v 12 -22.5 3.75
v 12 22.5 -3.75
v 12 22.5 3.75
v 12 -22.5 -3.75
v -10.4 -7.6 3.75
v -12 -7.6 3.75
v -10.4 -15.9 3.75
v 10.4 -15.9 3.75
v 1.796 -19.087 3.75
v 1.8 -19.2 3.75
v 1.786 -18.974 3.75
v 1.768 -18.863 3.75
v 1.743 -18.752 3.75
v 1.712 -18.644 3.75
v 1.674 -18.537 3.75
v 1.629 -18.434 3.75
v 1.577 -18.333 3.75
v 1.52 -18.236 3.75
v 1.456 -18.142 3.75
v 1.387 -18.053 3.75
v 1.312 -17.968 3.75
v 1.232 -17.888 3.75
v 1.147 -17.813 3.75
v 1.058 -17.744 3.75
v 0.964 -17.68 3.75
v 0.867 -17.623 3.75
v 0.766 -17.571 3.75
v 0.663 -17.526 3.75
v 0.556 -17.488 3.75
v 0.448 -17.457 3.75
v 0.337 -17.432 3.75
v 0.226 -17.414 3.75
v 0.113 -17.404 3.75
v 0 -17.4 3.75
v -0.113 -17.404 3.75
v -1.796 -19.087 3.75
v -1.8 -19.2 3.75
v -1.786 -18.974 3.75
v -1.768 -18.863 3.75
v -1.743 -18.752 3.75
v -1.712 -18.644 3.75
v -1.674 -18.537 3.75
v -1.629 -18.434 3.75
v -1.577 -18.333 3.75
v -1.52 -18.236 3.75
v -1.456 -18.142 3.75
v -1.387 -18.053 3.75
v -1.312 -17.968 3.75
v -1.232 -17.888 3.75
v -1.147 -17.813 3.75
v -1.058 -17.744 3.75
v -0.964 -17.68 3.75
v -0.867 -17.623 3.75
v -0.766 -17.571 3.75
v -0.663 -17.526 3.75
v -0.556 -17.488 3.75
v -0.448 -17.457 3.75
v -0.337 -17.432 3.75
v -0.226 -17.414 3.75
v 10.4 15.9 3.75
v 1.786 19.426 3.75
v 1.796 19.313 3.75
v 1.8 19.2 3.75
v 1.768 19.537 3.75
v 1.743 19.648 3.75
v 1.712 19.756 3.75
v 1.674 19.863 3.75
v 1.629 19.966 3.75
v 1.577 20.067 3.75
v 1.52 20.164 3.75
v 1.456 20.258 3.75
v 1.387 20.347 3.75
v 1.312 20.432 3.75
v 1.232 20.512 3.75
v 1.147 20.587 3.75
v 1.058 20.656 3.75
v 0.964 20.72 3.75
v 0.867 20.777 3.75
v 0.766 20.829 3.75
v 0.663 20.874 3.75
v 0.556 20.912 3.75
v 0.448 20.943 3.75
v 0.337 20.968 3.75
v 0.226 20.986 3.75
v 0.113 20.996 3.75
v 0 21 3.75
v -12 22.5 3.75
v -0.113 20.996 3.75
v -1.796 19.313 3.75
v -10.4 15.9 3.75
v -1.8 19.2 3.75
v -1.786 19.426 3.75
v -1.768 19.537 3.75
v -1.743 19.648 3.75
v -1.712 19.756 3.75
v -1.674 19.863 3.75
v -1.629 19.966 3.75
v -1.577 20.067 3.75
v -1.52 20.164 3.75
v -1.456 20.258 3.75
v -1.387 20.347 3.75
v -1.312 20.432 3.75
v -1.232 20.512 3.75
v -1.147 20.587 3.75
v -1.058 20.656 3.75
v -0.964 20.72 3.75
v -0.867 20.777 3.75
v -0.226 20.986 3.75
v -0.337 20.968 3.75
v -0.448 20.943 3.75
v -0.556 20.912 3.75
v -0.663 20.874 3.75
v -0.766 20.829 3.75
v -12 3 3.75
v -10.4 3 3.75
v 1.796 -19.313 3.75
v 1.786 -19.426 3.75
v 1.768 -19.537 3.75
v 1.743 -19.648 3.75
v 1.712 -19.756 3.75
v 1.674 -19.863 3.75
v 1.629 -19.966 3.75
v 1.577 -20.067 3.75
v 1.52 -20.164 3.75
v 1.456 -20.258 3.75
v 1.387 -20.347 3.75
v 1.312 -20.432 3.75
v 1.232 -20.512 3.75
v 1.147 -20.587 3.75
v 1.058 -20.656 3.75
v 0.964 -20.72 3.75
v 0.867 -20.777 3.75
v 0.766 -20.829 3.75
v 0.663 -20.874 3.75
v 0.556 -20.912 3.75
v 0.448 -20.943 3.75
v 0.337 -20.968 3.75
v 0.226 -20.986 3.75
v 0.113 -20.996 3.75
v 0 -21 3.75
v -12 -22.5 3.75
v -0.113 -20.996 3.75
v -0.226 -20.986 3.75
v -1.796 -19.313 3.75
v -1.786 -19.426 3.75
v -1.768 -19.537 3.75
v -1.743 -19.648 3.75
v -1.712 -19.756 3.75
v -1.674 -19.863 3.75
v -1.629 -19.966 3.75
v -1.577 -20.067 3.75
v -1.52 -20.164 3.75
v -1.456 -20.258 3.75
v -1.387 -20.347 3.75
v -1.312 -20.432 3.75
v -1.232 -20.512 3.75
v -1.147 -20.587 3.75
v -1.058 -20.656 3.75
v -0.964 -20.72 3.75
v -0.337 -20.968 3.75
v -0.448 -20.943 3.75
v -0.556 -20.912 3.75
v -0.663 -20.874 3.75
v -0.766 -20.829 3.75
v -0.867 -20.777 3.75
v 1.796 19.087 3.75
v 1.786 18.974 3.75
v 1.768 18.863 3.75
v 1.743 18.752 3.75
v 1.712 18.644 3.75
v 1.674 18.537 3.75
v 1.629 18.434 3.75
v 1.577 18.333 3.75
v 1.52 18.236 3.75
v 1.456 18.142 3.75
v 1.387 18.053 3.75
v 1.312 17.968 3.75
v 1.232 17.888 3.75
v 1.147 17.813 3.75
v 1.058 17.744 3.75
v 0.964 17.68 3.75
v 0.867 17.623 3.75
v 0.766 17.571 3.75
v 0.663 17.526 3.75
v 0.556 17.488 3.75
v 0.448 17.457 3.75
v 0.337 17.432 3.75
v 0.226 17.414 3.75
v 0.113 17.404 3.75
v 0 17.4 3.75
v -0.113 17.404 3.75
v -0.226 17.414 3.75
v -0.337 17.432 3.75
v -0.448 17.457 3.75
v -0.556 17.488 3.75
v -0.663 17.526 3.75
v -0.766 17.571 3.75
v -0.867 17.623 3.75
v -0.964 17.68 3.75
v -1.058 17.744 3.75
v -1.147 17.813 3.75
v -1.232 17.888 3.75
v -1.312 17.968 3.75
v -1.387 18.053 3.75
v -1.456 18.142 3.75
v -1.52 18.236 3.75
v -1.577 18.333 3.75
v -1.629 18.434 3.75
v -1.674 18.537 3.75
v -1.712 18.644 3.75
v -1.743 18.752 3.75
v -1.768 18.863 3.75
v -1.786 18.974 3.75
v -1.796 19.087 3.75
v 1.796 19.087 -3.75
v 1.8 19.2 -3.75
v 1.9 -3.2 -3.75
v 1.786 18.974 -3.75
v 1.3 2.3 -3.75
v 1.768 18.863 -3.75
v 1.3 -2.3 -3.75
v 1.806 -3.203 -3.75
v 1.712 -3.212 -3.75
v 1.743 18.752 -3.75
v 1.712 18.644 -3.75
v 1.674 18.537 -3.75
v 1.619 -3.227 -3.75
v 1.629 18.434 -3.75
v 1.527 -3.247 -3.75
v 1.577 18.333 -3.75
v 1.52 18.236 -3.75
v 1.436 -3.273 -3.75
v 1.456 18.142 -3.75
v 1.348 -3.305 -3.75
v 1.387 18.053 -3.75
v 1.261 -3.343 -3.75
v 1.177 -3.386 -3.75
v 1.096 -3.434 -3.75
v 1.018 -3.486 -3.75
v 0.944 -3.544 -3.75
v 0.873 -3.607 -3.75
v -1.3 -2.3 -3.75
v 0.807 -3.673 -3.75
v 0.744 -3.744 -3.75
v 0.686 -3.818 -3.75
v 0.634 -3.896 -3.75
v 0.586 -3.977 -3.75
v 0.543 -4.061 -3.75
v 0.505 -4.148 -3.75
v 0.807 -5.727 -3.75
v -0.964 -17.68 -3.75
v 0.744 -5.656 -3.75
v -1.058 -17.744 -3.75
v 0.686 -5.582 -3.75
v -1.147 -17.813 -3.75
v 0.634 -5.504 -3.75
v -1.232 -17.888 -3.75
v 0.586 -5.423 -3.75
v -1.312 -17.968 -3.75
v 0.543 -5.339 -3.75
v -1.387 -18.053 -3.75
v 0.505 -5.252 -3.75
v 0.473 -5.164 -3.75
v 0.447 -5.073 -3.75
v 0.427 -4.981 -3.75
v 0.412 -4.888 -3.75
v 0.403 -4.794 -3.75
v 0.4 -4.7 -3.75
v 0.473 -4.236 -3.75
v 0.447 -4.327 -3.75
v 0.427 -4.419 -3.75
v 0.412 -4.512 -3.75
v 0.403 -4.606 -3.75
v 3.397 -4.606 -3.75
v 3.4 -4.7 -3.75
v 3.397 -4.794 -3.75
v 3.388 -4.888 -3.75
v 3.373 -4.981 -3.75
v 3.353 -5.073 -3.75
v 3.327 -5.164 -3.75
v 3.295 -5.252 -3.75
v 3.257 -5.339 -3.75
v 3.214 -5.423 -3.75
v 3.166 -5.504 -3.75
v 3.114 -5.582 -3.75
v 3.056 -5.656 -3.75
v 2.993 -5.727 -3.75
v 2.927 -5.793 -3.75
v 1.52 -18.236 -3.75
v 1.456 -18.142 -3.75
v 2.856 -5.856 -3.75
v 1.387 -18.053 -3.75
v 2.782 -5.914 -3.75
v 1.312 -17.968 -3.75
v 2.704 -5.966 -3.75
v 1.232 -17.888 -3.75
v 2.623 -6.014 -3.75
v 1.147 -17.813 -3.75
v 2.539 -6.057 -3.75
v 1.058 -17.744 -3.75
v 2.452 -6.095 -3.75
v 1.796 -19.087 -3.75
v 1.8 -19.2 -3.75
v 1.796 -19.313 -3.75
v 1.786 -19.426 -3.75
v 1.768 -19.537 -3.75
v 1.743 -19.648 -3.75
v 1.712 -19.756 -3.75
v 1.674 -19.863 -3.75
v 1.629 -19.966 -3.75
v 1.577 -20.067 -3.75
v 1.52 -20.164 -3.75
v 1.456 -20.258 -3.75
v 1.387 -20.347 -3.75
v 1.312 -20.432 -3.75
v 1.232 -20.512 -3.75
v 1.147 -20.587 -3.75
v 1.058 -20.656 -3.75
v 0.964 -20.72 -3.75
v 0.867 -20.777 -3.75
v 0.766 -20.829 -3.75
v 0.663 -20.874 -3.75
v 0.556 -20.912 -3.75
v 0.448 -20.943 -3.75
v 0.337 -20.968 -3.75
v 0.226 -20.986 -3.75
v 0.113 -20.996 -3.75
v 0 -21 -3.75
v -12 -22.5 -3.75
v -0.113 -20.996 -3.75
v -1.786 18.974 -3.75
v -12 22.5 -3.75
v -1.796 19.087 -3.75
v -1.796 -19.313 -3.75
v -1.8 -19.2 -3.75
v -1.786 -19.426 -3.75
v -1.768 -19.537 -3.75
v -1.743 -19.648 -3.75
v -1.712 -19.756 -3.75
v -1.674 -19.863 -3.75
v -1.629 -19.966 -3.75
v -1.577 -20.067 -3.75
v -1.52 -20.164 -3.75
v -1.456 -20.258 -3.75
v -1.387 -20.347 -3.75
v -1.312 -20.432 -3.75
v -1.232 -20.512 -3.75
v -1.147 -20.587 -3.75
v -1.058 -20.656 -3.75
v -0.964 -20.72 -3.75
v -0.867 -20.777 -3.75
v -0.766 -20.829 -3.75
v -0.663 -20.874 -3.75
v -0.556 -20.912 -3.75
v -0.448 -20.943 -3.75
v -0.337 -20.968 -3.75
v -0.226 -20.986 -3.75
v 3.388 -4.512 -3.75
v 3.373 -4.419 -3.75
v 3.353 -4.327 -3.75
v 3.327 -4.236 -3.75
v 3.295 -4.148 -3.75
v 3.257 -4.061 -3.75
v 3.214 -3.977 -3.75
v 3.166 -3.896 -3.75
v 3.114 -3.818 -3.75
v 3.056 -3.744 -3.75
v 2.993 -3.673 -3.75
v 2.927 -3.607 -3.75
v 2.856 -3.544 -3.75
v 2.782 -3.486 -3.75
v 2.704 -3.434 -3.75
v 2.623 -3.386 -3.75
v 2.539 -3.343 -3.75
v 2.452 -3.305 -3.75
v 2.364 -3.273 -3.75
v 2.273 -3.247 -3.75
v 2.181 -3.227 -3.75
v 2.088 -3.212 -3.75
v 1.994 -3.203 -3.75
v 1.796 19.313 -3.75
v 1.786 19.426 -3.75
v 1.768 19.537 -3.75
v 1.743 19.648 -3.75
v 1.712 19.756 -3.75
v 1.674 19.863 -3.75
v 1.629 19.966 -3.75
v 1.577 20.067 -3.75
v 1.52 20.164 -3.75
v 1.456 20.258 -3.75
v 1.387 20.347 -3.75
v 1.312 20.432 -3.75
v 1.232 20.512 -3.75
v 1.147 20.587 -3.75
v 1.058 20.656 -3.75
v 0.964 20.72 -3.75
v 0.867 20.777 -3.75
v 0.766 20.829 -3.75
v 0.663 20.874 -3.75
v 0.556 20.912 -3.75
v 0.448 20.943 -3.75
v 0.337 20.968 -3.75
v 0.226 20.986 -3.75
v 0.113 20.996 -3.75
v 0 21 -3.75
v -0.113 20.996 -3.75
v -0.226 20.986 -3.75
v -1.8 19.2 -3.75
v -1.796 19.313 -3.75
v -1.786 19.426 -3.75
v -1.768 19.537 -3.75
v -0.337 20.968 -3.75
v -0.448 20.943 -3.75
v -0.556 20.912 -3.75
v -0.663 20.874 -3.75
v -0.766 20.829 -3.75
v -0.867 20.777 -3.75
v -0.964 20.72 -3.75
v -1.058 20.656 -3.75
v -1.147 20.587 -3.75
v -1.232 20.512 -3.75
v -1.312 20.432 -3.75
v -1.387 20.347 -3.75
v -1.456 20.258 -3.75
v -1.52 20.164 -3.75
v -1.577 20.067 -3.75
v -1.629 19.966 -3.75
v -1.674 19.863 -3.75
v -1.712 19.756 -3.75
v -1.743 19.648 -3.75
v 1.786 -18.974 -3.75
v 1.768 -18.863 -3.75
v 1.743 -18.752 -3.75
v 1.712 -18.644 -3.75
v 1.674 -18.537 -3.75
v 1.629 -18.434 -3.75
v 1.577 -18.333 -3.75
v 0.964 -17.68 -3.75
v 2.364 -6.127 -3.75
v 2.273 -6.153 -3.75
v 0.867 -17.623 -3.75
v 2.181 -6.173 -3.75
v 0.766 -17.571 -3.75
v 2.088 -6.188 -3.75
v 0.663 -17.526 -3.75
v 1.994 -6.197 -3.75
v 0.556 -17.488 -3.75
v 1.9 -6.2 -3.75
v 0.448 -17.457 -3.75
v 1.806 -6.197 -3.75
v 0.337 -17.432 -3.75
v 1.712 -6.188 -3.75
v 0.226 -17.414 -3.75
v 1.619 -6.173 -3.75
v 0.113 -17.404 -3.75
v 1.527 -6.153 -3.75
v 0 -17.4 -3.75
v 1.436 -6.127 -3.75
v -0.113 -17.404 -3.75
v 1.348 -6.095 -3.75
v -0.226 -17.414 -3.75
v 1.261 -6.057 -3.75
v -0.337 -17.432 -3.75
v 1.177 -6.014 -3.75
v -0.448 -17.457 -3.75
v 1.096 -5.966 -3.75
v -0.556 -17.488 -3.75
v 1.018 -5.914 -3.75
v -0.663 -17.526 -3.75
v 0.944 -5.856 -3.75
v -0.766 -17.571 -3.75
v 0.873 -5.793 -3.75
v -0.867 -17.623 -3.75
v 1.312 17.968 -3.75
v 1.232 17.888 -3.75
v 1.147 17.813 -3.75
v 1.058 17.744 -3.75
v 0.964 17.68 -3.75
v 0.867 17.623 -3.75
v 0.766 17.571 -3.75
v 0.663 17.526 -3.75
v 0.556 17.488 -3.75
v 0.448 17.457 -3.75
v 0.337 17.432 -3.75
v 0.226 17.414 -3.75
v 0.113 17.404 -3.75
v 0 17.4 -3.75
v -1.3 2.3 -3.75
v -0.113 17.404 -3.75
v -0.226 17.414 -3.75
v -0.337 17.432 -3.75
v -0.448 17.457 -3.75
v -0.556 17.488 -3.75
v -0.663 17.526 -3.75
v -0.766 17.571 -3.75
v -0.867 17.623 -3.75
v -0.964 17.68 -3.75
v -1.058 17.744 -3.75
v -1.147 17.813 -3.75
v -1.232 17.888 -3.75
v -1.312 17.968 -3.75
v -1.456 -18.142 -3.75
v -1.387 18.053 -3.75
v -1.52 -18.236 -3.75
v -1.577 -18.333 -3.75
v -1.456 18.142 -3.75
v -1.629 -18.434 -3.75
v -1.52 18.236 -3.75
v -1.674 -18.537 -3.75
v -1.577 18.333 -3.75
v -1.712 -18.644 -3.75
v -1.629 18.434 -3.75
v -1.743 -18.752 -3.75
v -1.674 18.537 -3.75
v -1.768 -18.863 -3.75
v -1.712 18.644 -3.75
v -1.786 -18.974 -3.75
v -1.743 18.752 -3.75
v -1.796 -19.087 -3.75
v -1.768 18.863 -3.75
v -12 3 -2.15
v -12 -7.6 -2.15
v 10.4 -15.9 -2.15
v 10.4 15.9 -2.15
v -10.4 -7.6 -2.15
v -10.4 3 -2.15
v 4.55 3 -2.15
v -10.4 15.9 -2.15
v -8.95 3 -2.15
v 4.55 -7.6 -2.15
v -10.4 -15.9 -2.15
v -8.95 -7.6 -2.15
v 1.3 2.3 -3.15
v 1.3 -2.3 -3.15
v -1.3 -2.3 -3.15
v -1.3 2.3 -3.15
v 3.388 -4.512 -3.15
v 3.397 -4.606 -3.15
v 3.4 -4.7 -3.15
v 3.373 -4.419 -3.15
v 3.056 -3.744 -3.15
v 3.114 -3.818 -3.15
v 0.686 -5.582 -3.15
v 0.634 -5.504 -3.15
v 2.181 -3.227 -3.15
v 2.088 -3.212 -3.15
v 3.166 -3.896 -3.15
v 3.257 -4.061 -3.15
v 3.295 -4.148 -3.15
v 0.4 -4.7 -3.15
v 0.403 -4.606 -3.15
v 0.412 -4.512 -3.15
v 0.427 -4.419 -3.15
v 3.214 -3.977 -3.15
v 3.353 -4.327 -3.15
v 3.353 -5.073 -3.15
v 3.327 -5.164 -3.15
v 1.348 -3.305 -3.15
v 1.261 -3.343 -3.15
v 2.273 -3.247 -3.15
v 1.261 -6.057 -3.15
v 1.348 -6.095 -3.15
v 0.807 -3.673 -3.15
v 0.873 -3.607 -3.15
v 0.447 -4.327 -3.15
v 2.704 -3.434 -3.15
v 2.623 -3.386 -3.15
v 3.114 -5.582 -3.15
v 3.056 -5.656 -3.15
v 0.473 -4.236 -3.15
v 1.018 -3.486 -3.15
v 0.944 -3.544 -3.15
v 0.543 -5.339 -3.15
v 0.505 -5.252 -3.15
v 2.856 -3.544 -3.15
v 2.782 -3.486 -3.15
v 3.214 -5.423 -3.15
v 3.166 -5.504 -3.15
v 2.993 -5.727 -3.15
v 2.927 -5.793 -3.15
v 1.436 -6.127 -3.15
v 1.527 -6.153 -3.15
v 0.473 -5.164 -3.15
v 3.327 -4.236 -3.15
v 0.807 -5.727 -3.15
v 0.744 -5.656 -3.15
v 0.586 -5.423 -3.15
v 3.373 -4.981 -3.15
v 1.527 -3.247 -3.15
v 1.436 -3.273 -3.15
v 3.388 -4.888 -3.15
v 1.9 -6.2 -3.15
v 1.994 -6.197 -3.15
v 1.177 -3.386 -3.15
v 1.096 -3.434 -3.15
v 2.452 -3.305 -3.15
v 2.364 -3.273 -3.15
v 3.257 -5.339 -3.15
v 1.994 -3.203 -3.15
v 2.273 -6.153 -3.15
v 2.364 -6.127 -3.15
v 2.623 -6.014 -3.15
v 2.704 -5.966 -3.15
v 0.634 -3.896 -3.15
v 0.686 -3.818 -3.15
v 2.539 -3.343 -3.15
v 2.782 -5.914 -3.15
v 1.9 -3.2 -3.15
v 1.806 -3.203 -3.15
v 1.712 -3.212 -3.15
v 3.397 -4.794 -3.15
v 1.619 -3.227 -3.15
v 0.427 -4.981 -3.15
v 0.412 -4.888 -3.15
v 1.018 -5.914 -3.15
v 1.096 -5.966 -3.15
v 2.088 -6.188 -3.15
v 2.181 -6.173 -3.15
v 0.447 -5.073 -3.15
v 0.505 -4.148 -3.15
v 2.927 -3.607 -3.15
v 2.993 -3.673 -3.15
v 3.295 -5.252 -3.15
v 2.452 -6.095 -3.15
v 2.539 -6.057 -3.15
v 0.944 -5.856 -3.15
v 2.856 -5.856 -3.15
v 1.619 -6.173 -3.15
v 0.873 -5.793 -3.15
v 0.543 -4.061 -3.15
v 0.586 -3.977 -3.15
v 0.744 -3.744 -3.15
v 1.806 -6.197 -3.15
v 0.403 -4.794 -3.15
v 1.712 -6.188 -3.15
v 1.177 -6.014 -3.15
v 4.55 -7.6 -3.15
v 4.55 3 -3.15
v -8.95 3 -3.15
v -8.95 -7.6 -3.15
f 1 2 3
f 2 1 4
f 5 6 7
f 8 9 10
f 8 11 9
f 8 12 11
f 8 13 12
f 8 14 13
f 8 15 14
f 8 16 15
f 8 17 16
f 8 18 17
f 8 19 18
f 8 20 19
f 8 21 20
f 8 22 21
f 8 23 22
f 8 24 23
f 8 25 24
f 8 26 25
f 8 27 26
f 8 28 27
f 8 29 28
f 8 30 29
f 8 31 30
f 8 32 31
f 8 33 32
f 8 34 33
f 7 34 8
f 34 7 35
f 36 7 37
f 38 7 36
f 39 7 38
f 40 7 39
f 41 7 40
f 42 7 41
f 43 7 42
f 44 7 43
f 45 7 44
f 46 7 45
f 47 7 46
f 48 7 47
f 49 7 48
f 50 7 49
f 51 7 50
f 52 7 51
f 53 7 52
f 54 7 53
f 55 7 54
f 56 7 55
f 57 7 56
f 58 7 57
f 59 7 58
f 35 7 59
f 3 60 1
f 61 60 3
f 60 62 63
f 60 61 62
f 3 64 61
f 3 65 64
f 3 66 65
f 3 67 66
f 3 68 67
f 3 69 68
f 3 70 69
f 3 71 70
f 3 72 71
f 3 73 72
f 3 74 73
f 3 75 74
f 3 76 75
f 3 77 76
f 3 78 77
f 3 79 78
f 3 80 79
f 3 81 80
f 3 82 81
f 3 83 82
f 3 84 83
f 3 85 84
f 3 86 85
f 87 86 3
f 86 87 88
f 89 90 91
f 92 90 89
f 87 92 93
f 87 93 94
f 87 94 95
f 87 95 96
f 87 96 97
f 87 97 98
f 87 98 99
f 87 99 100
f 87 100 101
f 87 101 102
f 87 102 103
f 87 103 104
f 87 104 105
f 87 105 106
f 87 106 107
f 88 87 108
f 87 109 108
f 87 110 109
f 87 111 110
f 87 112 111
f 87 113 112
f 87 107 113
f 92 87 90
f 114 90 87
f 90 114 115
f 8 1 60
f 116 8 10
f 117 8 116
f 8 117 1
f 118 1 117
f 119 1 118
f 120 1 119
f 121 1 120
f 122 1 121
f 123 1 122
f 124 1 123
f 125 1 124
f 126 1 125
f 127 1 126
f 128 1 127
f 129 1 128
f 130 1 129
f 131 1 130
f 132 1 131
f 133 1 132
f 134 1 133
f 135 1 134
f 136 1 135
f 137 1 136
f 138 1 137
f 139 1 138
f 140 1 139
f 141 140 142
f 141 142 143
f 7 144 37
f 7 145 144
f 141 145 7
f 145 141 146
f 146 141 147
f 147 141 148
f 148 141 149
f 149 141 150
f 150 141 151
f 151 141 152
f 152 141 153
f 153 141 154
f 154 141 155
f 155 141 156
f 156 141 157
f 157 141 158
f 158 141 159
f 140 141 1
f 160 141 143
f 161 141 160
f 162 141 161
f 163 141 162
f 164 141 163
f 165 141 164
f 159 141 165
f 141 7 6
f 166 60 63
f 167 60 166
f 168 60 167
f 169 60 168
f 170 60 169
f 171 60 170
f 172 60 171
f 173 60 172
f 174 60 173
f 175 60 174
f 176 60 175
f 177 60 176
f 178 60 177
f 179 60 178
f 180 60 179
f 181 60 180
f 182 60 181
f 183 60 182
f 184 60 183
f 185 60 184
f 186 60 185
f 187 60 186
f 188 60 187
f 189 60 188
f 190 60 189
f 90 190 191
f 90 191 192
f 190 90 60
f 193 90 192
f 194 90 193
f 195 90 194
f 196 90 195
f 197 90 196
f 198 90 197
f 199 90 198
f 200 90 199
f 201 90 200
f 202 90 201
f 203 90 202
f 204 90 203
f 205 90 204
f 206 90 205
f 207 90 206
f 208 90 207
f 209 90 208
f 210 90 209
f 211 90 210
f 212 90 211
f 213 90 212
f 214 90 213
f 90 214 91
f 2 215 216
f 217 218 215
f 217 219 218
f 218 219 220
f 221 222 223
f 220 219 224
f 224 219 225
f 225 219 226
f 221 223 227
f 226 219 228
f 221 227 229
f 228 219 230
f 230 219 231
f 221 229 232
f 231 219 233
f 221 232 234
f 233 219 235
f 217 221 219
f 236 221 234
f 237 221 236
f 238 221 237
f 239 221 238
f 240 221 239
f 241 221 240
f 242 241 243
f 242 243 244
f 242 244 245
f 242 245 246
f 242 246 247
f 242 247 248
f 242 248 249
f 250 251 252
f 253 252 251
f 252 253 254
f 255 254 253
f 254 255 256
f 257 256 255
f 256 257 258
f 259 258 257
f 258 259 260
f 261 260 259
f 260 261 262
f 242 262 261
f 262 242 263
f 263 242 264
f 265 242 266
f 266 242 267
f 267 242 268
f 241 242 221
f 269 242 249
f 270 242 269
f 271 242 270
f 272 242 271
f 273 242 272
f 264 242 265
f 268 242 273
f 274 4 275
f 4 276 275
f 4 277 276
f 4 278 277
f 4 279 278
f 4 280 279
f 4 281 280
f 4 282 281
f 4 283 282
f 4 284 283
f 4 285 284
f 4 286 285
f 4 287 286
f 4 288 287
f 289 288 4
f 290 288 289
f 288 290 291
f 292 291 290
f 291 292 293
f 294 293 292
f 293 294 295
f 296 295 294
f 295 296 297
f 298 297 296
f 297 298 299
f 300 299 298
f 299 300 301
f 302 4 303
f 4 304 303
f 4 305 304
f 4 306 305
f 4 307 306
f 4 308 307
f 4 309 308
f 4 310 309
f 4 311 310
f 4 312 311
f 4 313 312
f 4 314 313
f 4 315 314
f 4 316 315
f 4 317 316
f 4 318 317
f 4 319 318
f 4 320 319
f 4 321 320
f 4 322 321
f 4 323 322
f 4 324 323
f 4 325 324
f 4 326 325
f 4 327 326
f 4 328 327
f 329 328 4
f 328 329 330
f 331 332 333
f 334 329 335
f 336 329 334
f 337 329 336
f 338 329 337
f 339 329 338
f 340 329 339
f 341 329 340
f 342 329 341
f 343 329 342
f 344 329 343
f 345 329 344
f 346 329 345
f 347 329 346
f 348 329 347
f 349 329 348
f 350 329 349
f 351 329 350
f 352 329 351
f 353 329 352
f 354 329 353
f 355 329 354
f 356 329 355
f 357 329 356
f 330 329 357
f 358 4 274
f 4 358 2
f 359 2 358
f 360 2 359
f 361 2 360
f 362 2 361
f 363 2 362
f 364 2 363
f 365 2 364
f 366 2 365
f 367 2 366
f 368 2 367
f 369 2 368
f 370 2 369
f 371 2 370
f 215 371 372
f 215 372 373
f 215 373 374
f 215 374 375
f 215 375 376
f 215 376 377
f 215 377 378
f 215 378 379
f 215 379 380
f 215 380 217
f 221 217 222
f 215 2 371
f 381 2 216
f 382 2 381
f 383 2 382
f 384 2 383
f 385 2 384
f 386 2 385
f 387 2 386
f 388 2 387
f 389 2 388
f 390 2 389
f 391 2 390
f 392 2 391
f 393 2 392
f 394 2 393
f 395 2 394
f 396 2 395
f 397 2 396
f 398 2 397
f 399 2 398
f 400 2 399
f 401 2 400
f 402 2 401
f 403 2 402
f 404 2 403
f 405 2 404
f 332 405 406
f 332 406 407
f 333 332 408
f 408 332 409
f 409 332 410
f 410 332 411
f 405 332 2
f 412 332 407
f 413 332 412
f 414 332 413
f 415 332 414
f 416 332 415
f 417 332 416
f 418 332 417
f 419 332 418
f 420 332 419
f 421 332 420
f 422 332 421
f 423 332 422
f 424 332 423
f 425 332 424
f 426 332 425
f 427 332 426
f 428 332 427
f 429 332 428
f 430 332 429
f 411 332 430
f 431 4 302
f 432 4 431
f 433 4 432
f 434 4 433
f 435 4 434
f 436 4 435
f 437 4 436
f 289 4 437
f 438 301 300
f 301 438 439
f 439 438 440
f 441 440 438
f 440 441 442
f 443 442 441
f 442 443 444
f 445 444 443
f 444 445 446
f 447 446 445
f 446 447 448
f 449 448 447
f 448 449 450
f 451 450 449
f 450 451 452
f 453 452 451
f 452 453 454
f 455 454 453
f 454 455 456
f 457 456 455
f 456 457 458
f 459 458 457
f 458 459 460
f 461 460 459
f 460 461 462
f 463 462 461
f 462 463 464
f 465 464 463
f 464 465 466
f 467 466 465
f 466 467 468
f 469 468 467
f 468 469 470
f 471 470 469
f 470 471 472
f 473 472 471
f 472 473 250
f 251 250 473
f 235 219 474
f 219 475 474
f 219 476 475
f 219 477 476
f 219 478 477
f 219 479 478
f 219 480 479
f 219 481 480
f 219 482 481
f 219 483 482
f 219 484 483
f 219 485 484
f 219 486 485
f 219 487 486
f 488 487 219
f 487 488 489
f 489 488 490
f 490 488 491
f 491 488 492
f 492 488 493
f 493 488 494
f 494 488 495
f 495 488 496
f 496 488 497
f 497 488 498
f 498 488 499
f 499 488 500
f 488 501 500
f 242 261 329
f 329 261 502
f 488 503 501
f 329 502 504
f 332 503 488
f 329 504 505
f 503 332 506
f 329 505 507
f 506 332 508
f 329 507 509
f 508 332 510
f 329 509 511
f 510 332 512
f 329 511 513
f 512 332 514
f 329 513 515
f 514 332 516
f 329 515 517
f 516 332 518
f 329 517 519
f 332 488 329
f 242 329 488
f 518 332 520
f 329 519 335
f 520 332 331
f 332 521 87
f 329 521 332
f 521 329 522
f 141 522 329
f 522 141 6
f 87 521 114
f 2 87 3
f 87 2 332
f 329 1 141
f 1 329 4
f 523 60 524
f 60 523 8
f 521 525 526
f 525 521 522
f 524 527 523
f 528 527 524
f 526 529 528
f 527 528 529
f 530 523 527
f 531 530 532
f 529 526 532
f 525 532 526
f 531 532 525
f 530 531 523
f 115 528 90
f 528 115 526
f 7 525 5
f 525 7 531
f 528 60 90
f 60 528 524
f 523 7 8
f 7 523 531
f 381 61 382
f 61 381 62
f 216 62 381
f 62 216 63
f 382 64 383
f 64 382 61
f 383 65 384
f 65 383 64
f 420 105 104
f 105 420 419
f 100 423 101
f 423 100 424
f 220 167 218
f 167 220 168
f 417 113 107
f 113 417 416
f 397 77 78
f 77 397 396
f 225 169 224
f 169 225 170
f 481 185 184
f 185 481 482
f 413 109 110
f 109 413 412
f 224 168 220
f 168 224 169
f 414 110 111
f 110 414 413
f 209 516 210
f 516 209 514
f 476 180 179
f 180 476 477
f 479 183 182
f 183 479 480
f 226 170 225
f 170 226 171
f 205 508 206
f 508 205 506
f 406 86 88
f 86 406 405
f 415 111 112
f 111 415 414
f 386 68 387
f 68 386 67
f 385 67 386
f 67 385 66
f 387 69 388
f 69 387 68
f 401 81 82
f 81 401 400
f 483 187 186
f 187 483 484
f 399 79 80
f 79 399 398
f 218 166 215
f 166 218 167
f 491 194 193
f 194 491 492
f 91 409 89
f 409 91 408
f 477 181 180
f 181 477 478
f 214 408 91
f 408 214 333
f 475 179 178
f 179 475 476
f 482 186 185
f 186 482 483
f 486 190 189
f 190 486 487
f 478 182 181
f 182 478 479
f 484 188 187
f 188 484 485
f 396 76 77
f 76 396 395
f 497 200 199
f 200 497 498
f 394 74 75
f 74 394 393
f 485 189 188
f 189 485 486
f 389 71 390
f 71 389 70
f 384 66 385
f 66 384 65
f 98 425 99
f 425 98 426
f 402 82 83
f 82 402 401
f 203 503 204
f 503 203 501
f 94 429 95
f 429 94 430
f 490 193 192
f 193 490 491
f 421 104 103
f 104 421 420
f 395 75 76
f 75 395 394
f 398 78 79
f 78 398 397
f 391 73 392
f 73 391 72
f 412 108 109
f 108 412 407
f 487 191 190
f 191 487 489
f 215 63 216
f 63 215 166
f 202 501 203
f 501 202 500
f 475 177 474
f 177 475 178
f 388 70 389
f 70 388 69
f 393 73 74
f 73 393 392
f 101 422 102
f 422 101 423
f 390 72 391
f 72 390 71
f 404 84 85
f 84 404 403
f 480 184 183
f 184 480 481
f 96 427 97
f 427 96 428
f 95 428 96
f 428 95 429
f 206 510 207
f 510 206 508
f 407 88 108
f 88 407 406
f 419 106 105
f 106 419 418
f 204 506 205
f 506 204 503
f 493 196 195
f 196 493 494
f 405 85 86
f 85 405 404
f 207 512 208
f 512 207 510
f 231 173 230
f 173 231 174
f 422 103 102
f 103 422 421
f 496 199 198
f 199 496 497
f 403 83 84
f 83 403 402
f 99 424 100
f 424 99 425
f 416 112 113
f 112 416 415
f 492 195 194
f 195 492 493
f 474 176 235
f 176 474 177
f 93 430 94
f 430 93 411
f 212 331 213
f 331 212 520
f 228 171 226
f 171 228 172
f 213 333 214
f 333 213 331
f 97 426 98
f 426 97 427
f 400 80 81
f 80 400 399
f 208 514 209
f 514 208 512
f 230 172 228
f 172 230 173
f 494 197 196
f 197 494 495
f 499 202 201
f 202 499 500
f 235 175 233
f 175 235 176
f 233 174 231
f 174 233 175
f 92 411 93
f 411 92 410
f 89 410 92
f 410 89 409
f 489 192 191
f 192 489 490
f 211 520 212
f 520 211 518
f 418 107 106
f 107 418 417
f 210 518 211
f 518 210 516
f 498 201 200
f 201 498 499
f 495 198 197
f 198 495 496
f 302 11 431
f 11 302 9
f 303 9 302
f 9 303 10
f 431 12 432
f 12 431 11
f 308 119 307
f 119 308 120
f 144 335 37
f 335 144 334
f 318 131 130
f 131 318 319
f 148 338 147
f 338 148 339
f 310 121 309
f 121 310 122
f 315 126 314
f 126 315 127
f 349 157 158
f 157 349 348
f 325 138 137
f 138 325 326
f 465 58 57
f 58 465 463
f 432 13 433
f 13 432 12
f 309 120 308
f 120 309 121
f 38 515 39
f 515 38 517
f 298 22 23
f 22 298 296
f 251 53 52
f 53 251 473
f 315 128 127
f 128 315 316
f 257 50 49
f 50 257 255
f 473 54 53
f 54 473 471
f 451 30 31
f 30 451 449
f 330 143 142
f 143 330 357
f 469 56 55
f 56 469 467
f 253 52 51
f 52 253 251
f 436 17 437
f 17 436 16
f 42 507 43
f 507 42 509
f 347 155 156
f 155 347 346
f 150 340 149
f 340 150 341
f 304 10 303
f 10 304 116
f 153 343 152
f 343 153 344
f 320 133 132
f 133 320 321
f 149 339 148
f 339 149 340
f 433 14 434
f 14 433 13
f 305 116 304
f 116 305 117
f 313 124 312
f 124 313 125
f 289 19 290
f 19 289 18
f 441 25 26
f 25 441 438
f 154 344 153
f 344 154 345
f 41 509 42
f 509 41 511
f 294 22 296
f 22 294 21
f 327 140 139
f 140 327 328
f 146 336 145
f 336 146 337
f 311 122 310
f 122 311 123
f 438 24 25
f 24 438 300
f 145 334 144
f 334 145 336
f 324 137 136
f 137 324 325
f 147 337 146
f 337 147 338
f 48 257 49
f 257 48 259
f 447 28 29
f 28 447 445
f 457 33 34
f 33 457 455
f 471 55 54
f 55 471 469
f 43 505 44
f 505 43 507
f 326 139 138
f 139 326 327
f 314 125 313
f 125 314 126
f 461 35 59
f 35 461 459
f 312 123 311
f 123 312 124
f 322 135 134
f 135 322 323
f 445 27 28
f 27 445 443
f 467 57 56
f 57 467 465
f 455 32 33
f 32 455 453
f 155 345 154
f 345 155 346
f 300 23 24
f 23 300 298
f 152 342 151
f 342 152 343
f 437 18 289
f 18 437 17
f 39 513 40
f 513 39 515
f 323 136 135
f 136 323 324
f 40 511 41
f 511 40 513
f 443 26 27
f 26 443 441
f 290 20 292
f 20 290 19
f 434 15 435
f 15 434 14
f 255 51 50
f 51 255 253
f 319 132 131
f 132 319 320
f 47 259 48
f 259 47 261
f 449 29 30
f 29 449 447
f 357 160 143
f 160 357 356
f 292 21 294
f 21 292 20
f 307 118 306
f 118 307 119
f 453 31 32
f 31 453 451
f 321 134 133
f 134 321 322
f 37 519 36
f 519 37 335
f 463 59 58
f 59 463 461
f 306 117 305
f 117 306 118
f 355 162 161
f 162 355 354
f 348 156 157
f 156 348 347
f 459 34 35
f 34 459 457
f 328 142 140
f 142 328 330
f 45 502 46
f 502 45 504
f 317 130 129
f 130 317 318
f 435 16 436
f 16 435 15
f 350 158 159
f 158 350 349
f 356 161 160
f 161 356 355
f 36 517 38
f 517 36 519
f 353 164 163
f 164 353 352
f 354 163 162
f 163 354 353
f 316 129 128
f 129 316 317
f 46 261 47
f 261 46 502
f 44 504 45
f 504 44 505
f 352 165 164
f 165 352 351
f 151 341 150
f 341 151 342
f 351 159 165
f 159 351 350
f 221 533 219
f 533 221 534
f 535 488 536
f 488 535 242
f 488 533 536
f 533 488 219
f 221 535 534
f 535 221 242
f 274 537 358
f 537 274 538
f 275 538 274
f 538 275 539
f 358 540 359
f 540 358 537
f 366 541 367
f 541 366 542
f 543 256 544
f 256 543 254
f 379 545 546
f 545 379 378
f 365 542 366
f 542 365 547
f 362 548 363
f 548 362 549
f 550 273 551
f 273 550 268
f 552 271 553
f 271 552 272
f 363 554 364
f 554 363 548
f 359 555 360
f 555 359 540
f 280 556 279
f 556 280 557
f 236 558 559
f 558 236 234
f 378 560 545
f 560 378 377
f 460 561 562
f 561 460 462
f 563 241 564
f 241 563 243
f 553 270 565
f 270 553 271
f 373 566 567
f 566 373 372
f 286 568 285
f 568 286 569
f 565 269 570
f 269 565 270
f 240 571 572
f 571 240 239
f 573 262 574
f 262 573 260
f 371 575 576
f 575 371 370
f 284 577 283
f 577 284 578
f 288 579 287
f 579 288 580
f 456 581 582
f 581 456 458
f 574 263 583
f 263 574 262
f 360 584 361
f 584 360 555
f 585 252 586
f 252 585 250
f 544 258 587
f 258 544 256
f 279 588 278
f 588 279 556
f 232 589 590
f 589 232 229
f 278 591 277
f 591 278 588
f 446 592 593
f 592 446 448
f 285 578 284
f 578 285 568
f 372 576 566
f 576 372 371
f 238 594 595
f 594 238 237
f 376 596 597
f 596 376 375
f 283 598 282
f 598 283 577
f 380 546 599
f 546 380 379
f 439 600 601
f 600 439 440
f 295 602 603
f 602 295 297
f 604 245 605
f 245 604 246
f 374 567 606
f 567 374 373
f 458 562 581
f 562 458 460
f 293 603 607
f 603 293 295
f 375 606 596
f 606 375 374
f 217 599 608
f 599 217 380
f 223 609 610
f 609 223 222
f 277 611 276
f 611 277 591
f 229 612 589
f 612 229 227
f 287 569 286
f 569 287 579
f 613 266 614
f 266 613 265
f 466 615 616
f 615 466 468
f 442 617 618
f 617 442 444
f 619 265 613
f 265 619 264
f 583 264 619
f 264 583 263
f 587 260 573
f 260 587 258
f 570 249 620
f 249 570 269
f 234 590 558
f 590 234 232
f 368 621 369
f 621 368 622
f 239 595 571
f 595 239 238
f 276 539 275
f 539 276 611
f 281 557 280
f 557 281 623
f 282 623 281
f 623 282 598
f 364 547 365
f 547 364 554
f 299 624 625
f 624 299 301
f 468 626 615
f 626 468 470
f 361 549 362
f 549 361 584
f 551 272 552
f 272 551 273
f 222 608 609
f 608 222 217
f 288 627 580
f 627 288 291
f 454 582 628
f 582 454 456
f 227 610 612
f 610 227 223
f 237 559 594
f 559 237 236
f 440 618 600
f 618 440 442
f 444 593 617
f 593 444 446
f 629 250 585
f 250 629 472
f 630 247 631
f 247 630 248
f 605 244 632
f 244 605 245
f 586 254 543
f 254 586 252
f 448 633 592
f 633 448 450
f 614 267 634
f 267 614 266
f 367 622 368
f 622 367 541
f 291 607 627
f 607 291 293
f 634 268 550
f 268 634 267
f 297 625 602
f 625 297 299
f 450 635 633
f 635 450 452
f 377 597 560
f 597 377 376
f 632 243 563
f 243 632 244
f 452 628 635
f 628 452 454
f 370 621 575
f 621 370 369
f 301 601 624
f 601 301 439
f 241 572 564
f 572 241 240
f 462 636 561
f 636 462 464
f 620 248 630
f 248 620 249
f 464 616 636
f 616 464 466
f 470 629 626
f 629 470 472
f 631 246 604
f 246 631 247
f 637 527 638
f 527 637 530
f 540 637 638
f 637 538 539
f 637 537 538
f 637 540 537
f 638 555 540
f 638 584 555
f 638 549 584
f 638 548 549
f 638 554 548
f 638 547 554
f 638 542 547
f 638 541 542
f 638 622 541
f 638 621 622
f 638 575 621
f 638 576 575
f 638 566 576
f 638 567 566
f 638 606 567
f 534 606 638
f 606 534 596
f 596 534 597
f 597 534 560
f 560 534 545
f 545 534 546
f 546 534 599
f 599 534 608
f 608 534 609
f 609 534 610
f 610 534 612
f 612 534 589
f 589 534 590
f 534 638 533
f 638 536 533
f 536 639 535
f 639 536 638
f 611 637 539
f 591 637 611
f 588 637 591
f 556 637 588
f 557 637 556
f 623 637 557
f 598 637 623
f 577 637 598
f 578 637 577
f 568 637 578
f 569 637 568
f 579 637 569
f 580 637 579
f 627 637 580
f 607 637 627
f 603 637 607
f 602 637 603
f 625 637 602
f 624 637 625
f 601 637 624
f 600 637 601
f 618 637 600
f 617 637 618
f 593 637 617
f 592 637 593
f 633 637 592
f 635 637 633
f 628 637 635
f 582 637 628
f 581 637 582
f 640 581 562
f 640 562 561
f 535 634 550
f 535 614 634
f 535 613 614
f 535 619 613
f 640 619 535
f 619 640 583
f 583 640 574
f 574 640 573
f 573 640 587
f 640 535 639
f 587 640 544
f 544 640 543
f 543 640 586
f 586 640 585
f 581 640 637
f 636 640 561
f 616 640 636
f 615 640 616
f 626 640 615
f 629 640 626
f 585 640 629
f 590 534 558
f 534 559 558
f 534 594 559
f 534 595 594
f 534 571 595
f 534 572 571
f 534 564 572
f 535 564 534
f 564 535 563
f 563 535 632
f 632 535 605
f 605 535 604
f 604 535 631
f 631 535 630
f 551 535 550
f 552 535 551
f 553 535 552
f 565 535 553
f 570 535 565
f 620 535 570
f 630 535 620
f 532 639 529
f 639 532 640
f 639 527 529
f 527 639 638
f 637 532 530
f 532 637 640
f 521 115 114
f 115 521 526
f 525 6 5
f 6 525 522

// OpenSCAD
/*
    Scanner para análisis tridimensional de cobertura vegetal del suelo
    
    Descripción de la pieza: Zócalo para sensor laser VL53L0X. Va atornillado a la base del carro móvil que se desplaza sobre el eje X.
    Cantidad requerida: 1.

    Autor: Matias J. Micheletto    
    Noviembre 2017
    Directores: Rodrigo Santos - Juan Galantini
    Laboratorio de Sistemas Digitales
    Universidad Nacional del Sur - Departamento de Ingeniería Eléctrica y Computadoras    
*/

$fn = 100; // Resolucion del modelo

// Dimensiones exteriores del montaje
W = 24; // Ancho (en direccion X)
L = 45; // Largo (en direccion Y)
H = 7.5;  // Altura (en direccion Z)
e = 1.6;  // Espesor fondo y paredes

// Dimensiones del sensor
Ws = 2.4+0.2; // Ancho (X)
Ls = 4.4+0.2; // Alto (Y)

// Dimensiones y posicion de la plaqueta
Wp = 13.3+0.2; // Ancho (X)
Lp = 10.4+0.2; // Largo (Y)
ep = 1; // Espesor del hundimiento
xp = -2.2;
yp = -2.3;

// Dimensiones y posicion del tornillo de la plaqueta
Rs = 1.3+0.2; // Radio del orificio para el tornillo de la plaqueta
xs = 1.9;
ys = -4.7;

// Tornillos de ajuste
Rp = 1.8; // Radio de los orificios para tornillos
s = 1.5; // Separacion entre el orificio y el borde de la pieza



difference(){
    // Envolvente
    cube([W,L,H], center = true);
    
    // Interior
    translate([0,0,e/2])
        cube([W-2*e,L-4*s-4*Rp,H-e], center = true);
    
    // Agujeros para tornillos
    translate([0,L/2-Rp-s,0])
        cylinder(r = Rp, h = H, center = true);
    translate([0,-L/2+Rp+s,0])
        cylinder(r = Rp, h = H, center = true);
    
    // Orificio para sensor (centrado)
    translate([0,0,-H/2+e/2])
        cube([Ws,Ls,e], center = true);
    
    // Orificio para tornillo de la plaqueta
    translate([xs,ys,-H/2+e/2])
        cylinder(r = Rs, h = e, center = true);
    
    // Hueco para plaqueta    
    translate([xp,yp,-H/2+e-ep/2])
        cube([Wp,Lp,ep], center = true);
        
    // Agujero para sacar los cables
    translate([-W/2+e/2,yp,e/2])
        cube([e,Lp,H-e], center = true);
}
